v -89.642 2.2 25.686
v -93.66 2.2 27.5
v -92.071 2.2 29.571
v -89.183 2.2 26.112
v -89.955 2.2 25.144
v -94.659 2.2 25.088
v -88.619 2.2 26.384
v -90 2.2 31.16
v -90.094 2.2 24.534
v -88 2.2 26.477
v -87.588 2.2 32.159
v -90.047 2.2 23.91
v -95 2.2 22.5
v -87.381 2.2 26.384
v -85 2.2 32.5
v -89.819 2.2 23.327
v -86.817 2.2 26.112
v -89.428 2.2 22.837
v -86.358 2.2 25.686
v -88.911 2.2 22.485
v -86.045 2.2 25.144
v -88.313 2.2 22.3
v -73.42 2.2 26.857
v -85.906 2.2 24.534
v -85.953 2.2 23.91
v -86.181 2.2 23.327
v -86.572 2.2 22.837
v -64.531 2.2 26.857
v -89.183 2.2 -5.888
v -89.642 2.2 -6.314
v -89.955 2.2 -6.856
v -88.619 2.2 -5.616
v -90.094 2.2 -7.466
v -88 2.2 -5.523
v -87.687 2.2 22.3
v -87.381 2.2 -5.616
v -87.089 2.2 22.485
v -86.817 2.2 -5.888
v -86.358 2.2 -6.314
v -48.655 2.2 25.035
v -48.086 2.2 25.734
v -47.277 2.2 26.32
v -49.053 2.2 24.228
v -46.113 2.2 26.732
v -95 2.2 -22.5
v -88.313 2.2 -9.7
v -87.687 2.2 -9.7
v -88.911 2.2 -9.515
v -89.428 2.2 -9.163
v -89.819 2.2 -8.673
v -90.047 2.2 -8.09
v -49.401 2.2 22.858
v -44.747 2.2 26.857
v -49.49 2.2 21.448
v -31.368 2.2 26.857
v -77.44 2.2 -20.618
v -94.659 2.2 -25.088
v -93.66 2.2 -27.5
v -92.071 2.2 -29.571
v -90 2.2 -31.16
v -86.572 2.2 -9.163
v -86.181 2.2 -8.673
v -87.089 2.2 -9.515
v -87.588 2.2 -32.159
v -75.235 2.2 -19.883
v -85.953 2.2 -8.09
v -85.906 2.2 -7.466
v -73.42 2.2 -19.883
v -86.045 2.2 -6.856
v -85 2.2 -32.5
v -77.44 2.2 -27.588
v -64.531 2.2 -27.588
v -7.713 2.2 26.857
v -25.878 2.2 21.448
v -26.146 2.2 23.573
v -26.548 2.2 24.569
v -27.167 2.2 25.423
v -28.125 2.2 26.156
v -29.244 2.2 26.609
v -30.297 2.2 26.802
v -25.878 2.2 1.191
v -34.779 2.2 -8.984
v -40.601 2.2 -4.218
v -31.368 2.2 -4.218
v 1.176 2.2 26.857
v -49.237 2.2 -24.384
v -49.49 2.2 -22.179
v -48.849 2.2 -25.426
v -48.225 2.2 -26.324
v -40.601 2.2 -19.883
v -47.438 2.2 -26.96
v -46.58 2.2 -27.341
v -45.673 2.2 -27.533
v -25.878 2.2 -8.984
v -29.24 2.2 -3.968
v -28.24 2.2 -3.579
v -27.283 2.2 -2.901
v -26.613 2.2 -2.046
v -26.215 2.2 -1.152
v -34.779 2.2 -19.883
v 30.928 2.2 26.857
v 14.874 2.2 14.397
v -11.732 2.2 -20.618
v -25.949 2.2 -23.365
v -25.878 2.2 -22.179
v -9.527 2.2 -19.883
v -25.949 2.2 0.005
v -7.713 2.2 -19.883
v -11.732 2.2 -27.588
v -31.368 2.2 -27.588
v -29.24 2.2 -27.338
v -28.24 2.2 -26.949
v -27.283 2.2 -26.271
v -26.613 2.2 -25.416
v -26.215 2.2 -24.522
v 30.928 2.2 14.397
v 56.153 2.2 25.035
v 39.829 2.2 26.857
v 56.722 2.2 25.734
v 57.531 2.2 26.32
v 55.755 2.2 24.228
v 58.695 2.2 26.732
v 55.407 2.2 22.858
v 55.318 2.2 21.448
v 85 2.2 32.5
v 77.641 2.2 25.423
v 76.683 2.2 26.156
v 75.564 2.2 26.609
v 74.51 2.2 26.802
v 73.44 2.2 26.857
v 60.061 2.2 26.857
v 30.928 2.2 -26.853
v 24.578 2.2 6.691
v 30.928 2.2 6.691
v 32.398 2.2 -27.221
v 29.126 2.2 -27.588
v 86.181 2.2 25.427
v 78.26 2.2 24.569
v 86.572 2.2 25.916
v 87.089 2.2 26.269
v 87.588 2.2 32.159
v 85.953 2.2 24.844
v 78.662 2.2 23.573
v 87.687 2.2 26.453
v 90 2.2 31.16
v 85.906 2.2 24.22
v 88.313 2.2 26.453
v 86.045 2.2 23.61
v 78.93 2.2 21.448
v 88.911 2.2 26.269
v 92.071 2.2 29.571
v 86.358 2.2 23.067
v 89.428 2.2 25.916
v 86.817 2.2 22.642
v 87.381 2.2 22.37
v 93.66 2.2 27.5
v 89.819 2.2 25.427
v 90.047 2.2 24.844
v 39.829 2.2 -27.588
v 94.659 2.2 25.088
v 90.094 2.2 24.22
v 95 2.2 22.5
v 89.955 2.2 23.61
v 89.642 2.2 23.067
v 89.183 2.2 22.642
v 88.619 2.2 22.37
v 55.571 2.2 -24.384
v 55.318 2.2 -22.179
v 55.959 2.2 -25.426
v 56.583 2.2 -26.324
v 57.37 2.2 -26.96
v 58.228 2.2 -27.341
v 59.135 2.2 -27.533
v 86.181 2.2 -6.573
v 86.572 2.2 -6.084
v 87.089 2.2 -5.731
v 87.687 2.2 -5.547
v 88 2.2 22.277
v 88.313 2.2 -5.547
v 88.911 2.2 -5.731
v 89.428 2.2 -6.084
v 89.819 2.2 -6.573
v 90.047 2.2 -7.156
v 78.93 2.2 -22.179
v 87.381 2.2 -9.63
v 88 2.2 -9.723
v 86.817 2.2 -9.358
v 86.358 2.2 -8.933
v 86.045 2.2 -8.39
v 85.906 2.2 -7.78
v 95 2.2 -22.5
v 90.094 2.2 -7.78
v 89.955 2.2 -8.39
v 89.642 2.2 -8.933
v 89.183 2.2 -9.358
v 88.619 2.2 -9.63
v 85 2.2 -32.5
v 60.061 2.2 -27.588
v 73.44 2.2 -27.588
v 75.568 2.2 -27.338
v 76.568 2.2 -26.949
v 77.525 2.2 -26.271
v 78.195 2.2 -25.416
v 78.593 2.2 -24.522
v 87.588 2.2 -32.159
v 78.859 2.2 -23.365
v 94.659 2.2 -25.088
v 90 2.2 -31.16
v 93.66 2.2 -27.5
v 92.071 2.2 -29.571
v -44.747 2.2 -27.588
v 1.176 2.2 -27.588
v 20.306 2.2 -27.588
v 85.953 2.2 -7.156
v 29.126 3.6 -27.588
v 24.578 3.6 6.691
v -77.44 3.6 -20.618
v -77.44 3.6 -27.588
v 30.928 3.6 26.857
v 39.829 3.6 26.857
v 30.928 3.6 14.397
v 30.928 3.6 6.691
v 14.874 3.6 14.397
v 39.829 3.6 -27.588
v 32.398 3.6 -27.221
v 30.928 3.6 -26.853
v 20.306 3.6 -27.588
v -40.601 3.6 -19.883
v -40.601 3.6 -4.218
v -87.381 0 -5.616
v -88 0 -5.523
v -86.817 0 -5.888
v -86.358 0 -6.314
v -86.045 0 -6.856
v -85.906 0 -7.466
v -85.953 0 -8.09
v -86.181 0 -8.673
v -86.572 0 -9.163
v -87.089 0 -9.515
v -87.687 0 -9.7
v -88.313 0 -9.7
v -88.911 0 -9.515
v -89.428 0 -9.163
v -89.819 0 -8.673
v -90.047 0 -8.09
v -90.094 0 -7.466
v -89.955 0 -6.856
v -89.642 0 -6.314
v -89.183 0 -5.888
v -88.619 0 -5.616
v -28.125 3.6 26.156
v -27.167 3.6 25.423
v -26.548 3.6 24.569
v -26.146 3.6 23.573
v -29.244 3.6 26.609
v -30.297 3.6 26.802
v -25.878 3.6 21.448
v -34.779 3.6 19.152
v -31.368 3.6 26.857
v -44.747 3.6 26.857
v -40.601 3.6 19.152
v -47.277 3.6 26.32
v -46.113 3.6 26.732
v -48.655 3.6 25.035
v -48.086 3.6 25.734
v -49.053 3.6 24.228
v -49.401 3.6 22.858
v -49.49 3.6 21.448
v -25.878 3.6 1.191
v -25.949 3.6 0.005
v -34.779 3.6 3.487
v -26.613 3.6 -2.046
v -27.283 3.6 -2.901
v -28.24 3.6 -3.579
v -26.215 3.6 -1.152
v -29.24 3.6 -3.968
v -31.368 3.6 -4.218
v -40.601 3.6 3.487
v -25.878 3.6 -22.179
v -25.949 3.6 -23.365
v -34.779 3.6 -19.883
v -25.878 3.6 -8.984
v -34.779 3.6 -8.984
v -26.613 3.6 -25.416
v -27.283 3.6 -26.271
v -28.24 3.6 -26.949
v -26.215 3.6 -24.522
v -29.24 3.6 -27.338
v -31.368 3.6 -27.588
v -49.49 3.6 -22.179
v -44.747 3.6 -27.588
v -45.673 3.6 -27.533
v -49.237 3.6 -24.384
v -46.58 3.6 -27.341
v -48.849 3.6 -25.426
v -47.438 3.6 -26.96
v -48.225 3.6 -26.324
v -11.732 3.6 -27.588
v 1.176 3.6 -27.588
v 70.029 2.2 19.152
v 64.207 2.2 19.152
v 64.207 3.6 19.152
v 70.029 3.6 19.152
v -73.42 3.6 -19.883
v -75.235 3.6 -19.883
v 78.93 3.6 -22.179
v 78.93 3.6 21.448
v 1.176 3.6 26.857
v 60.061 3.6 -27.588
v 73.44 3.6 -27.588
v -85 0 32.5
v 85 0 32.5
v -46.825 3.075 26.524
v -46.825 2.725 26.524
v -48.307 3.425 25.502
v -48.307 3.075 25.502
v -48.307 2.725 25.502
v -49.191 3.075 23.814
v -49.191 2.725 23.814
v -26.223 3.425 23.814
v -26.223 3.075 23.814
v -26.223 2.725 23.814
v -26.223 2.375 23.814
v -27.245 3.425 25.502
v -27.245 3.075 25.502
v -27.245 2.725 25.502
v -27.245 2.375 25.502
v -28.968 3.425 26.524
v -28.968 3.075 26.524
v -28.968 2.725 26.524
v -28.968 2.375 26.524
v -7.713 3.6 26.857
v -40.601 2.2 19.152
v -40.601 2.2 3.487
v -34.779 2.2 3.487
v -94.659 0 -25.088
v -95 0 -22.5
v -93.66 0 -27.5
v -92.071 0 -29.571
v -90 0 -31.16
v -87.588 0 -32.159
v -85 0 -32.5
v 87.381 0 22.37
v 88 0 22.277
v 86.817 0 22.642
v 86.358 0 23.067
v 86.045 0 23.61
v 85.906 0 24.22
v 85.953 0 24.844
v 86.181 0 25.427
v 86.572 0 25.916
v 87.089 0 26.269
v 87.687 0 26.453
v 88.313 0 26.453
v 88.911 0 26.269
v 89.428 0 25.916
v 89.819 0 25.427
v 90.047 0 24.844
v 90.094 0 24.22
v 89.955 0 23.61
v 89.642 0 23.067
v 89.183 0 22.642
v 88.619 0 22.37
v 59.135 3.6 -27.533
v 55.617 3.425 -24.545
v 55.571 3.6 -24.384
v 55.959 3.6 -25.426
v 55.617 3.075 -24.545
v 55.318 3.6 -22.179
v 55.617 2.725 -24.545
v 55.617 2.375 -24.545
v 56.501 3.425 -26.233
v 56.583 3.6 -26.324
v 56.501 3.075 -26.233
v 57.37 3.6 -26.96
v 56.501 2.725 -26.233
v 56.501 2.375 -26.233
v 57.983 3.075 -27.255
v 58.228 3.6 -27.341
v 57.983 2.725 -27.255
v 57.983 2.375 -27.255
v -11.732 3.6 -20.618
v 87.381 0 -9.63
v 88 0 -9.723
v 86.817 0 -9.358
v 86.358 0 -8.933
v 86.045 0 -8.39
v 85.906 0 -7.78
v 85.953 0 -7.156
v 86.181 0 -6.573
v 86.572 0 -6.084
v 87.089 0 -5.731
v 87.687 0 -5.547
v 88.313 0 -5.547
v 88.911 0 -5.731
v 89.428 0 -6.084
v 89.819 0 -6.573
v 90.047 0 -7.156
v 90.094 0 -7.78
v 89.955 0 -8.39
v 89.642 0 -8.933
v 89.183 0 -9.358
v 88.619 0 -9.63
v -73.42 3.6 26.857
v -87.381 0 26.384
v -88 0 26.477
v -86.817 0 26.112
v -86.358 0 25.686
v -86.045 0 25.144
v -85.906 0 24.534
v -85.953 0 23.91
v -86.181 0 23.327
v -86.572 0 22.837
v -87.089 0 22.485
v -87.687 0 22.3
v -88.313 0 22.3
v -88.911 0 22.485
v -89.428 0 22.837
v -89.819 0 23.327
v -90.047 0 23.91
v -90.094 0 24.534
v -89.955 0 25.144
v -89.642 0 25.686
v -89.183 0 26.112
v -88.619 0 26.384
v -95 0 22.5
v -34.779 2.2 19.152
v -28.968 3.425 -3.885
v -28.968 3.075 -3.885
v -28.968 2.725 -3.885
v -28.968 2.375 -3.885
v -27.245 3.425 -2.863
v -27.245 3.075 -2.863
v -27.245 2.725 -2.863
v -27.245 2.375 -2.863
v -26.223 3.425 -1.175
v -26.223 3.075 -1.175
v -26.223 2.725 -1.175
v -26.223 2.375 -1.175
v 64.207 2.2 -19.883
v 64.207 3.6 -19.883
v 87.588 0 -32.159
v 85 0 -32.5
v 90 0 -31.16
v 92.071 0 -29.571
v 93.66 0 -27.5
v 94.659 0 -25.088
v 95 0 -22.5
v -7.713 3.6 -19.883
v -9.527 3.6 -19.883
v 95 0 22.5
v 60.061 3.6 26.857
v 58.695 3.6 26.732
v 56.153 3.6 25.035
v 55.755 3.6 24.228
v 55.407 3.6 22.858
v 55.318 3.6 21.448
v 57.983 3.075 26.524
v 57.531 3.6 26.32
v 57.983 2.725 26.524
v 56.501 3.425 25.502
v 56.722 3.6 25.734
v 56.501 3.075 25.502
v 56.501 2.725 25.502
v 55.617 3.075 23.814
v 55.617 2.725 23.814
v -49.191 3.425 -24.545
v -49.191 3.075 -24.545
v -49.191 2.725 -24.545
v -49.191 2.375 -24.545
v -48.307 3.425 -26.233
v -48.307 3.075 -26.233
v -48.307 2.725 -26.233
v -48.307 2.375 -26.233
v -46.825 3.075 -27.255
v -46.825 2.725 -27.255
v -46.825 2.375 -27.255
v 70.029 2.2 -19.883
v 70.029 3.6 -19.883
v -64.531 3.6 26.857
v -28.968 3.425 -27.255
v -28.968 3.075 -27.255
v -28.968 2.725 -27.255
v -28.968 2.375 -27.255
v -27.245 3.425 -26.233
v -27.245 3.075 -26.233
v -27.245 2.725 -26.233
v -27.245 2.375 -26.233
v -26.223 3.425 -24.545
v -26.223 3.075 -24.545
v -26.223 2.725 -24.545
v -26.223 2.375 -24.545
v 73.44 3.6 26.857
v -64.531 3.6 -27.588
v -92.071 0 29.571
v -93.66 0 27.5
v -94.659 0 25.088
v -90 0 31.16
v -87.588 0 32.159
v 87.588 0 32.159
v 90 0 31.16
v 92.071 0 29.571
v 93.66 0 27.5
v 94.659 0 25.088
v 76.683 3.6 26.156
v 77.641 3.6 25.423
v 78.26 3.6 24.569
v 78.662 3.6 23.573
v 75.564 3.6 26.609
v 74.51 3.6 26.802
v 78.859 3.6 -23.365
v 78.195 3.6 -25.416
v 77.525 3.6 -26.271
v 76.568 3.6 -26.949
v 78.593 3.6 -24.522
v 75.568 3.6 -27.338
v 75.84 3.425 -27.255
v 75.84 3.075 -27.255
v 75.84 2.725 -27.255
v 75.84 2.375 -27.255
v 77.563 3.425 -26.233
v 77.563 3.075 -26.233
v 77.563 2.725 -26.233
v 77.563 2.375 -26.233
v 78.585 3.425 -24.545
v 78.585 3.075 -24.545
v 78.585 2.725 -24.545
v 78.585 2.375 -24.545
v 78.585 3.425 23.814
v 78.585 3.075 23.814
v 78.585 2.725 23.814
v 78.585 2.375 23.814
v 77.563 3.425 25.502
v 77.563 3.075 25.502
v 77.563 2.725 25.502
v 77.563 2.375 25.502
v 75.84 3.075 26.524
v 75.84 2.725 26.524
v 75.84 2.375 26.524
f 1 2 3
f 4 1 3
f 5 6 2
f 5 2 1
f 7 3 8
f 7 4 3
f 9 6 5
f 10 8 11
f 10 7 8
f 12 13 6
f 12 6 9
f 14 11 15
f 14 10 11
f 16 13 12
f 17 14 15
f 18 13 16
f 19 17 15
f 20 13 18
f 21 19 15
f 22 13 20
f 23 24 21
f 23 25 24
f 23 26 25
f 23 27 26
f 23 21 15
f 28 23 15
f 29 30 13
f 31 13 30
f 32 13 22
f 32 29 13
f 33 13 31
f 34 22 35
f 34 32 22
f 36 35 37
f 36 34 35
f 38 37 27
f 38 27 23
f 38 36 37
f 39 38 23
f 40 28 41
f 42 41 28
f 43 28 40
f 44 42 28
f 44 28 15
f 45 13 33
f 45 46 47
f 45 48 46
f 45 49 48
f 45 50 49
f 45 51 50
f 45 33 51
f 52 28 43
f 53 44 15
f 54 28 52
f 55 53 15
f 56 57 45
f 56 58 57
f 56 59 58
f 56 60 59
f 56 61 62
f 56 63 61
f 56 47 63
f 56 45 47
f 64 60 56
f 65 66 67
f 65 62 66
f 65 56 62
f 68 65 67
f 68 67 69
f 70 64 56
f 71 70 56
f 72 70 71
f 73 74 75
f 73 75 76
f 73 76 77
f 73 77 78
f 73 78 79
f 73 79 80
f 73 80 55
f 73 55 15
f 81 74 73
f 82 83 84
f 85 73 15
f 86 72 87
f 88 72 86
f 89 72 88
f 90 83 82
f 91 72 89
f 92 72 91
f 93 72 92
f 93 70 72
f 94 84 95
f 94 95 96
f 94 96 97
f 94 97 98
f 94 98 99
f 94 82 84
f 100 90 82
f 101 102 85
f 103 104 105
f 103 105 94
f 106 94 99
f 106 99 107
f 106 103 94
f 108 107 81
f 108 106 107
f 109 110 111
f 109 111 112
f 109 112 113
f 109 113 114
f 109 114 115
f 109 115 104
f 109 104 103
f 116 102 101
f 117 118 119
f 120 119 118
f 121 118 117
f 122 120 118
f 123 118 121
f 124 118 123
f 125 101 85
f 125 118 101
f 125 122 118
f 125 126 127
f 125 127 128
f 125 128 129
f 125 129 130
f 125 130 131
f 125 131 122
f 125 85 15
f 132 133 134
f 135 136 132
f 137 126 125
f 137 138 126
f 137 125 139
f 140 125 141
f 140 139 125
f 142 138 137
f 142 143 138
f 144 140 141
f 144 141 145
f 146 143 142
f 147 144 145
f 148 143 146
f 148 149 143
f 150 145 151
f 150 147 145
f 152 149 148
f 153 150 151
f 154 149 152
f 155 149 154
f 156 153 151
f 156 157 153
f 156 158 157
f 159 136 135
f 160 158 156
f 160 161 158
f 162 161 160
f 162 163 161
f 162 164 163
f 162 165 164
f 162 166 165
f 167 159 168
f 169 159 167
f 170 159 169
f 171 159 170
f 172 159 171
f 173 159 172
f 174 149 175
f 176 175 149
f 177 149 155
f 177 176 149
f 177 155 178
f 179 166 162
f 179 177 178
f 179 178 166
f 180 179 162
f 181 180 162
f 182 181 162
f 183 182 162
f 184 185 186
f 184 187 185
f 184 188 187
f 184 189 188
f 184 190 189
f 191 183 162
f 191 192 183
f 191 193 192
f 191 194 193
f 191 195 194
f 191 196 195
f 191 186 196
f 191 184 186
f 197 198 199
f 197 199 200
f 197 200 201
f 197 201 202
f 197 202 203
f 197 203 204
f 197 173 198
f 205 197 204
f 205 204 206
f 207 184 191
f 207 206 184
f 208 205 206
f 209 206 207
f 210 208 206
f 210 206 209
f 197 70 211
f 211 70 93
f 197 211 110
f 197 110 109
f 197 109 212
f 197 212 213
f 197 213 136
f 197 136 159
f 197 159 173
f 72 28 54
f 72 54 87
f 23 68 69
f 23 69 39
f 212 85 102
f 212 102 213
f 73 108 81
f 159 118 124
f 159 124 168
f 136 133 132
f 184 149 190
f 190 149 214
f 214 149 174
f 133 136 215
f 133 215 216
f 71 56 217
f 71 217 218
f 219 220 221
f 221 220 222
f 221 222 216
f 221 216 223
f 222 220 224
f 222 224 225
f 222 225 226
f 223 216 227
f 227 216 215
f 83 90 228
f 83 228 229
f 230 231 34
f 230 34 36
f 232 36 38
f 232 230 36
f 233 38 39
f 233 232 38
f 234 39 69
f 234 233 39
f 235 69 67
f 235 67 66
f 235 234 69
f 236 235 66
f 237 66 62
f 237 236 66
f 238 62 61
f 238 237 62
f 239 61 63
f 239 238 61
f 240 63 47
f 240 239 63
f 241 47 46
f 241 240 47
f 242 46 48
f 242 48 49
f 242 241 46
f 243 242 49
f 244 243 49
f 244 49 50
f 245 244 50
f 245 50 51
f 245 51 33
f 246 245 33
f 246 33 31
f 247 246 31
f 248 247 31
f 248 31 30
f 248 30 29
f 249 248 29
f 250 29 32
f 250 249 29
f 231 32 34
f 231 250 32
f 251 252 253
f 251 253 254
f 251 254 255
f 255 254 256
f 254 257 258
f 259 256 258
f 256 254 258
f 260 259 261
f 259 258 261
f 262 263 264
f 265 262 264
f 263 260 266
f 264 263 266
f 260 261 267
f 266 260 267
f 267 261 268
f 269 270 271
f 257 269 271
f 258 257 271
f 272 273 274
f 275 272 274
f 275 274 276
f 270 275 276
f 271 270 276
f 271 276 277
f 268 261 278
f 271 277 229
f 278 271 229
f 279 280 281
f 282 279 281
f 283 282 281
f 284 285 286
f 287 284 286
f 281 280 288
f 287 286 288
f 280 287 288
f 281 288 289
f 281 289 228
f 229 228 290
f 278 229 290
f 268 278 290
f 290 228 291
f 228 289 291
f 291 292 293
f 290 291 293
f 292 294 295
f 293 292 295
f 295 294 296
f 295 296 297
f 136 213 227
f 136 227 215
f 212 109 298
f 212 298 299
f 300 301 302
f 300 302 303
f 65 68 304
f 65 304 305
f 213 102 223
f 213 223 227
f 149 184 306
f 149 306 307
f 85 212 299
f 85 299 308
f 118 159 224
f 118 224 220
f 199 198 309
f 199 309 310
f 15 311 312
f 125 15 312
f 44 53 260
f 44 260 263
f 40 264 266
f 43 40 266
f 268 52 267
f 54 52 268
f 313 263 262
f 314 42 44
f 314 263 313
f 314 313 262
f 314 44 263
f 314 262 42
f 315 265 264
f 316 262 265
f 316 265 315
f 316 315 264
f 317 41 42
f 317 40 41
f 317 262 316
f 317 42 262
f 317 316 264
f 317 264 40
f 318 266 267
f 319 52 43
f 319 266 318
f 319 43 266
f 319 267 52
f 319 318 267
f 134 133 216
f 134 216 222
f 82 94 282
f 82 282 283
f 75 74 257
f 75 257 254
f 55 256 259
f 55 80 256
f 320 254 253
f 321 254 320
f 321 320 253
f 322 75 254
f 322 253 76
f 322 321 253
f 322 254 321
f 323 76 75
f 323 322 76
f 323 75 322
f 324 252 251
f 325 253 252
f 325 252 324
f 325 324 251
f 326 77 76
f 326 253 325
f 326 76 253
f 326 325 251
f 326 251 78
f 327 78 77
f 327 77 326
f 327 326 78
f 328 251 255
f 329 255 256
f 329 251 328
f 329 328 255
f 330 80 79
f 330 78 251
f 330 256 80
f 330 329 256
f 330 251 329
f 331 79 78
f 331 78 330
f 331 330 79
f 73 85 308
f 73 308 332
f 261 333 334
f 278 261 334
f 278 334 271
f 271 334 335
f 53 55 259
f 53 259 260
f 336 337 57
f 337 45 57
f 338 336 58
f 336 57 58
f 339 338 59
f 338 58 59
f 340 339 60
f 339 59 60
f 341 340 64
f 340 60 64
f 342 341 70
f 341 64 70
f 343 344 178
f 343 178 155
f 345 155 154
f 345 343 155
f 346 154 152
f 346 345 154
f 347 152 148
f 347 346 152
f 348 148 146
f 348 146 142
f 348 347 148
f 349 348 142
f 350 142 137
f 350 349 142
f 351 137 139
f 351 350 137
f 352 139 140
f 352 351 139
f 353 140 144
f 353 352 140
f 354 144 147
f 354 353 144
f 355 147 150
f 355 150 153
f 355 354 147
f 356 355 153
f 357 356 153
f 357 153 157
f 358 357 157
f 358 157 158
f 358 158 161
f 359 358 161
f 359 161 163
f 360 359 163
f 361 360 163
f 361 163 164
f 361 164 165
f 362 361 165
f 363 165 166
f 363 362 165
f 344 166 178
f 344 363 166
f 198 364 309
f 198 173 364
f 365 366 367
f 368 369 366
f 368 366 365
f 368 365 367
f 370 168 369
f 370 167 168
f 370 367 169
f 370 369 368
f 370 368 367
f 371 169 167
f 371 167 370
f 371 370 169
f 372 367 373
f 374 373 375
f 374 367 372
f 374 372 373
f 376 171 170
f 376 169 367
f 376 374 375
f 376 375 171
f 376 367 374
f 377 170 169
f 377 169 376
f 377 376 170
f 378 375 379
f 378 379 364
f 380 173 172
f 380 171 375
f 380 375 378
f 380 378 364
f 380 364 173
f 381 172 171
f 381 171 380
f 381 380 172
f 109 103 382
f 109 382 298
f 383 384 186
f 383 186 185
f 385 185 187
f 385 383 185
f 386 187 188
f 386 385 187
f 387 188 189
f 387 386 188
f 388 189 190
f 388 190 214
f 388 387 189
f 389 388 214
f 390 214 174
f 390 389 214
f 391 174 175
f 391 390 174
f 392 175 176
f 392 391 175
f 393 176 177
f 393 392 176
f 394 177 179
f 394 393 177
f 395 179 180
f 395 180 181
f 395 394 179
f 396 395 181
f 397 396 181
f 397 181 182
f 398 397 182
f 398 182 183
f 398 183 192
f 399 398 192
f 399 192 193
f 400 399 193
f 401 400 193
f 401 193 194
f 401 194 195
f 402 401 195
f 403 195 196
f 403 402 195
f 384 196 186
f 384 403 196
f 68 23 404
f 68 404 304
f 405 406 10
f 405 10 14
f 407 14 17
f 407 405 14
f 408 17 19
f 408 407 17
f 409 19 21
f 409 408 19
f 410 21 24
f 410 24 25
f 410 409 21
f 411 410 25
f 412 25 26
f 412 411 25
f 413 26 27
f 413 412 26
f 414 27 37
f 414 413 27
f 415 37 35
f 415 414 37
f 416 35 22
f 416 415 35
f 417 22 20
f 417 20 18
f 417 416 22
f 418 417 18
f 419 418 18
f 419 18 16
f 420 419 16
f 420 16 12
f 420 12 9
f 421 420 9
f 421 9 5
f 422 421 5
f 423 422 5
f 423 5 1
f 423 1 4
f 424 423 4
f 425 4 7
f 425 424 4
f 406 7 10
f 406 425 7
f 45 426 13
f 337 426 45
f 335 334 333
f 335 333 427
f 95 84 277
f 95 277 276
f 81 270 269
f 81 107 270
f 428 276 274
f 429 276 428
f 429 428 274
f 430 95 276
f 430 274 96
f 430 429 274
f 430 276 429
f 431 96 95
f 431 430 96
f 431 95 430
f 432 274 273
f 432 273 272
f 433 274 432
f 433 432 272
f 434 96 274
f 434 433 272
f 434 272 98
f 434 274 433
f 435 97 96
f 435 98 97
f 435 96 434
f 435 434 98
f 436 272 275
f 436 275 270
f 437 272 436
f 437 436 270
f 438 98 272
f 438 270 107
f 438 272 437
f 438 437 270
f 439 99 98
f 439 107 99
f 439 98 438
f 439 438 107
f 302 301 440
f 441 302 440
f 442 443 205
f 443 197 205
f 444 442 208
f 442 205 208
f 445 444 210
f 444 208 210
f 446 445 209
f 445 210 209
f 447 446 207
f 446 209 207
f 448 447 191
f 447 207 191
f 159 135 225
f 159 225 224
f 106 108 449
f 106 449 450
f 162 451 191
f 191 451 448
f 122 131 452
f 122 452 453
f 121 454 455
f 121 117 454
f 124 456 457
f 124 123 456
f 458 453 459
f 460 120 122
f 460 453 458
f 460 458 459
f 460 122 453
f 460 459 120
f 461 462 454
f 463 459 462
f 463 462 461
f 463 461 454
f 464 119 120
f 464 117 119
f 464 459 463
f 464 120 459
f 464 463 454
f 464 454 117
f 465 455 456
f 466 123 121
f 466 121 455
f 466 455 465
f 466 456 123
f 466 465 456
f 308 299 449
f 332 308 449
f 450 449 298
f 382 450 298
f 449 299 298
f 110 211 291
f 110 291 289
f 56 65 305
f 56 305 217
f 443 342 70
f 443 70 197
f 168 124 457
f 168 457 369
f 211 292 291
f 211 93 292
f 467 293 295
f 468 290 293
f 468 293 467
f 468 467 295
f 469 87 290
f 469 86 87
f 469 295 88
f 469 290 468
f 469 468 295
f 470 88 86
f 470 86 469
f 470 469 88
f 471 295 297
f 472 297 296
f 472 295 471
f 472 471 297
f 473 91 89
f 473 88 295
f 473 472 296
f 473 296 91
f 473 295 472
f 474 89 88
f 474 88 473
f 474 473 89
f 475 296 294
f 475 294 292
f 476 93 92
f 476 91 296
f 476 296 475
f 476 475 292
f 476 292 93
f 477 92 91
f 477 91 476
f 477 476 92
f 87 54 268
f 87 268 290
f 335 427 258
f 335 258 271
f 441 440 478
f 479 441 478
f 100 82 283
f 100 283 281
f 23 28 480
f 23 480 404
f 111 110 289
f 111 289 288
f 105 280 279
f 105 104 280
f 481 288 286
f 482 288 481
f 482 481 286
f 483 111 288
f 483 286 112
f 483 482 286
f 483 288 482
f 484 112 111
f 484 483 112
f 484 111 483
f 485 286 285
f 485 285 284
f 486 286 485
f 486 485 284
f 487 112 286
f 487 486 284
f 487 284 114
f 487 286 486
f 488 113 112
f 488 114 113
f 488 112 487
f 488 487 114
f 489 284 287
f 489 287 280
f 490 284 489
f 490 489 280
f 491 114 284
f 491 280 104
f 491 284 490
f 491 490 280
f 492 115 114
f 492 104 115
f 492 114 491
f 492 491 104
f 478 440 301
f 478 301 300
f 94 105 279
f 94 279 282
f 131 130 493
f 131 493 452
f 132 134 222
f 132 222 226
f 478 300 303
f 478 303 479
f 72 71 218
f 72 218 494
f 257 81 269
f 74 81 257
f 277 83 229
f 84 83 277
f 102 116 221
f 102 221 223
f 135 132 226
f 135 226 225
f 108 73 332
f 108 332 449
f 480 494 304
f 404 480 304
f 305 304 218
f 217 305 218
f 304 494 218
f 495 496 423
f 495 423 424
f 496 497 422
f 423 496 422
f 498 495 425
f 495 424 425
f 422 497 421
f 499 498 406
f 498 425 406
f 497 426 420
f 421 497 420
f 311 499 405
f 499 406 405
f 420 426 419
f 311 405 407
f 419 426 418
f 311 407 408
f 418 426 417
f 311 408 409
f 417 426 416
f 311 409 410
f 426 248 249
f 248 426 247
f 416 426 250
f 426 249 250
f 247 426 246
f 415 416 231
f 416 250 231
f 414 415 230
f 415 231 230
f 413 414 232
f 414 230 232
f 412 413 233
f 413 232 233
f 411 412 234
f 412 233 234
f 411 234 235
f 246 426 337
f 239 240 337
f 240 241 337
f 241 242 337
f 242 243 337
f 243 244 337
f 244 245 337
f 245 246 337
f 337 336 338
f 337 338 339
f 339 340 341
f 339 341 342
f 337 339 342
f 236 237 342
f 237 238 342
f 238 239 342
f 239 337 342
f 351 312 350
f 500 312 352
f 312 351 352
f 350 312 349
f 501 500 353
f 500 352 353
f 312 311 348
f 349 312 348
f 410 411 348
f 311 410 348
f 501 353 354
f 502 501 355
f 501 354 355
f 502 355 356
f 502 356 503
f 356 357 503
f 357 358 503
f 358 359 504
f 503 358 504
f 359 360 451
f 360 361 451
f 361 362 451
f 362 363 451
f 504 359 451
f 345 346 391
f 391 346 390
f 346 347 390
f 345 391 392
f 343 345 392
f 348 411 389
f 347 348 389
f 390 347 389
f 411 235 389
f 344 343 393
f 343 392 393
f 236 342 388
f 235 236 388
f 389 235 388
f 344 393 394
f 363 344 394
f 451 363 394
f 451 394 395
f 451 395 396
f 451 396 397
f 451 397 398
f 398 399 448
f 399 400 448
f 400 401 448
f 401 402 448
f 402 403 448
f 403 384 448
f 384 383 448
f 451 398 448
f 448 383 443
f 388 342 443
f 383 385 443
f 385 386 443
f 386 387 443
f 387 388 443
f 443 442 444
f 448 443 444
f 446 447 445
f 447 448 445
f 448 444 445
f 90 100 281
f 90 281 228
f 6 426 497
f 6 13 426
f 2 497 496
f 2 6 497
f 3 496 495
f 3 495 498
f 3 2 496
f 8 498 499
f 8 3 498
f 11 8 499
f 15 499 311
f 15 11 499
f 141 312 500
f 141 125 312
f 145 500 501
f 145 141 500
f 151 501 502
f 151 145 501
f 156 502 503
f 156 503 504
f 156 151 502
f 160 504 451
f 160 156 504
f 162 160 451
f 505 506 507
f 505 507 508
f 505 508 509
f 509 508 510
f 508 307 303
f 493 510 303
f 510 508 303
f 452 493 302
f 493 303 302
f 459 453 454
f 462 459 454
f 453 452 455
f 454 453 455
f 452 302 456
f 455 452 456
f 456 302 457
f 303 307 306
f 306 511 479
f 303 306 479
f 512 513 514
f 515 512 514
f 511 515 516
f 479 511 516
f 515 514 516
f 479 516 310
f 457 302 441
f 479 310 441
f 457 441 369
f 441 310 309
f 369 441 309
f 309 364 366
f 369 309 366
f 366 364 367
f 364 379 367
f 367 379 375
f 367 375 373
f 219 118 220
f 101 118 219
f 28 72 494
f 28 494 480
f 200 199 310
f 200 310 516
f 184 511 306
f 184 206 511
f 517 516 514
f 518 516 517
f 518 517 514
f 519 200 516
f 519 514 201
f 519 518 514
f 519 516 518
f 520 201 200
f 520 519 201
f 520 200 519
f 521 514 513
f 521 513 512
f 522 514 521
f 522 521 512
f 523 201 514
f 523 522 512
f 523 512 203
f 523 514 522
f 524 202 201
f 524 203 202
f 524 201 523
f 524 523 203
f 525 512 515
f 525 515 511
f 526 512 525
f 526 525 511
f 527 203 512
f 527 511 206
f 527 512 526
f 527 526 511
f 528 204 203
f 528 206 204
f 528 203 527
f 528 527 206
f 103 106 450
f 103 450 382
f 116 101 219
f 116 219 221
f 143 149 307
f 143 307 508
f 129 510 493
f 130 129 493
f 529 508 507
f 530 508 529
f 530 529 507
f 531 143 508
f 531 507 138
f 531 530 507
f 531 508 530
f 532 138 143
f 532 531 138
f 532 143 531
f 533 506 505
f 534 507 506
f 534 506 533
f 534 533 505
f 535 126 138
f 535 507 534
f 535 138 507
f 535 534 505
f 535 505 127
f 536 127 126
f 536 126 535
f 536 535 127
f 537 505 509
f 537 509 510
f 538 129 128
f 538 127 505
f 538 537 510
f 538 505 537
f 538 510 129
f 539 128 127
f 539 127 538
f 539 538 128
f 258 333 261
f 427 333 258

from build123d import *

# Parameters (mm, degrees)
SKETCH1_W           = 190
SKETCH1_H           = 65
SKETCH1_R           = 2.1
BOSS_EXTRUDE1_DEPTH = 2.2
SKETCH3_W           = 5.822409575
SKETCH3_H           = 15.664234042
SKETCH3_W_2         = 5.822409574
SKETCH3_H_2         = 39.034260638
BOSS_EXTRUDE3_DEPTH = 1.4
FILLET1_R           = 10


with BuildPart() as part:
    # Sketch1 → Boss-Extrude1 (new body)
    with BuildSketch(Plane(origin=(0, 0, 0), x_dir=(1, 0, 0), z_dir=(0, 1, 0))):
        Rectangle(SKETCH1_W, SKETCH1_H)
        with Locations(Location((-88, 7.623179707, 0), (0, 0, 270))):
            Circle(SKETCH1_R, mode=Mode.SUBTRACT)
        with Locations(Location((-88, -24.376820293, 0), (0, 0, 270))):
            Circle(SKETCH1_R, mode=Mode.SUBTRACT)
        with Locations(Location((88, -24.376820293, 0), (0, 0, 90))):
            Circle(SKETCH1_R, mode=Mode.SUBTRACT)
        with Locations(Location((88, 7.623179707, 0), (0, 0, 90))):
            Circle(SKETCH1_R, mode=Mode.SUBTRACT)
    extrude(amount=BOSS_EXTRUDE1_DEPTH)

    # Sketch3 → Boss-Extrude3 (add)
    # profile 1 of 5: a face of its own
    with BuildSketch(Plane(origin=(0, 2.2, 0), x_dir=(1, 0, 0), z_dir=(0, 1, 0))):
        Polygon((-77.439519604, 20.61757665), (-77.439519604, 27.58839048), (-64.531455774, 27.58839048), (-64.531455774, -26.857455265), (-73.42010471, -26.857455265), (-73.42010471, 19.882597927), (-75.234583434, 19.882597927), align=None)
    # profile 2 of 5: a face of its own
    with BuildSketch(Plane(origin=(0, 2.2, 0), x_dir=(1, 0, 0), z_dir=(0, 1, 0))):
        with BuildLine():
            Line((-34.778598327, 8.984241544), (-34.778598327, 19.882597927))
            Line((-34.778598327, 19.882597927), (-40.601007902, 19.882597927))
            Line((-40.601007902, 19.882597927), (-40.601007902, 4.218363884))
            Line((-40.601007902, 4.218363884), (-31.367837689, 4.218363884))
            add(Edge.make_bspline(
                [(-31.367837689, 4.218363884), (-30.937734177, 4.205882557), (-30.126413548, 4.182338553), (-28.991073812, 3.931040784), (-28.02102206, 3.502870767), (-27.219902727, 2.897866579), (-26.601465528, 2.109735687), (-26.1809682, 1.150054083), (-25.910893392, 0.033711404), (-25.889664372, -0.767797312), (-25.878465349, -1.190620158)],
                knots=[0, 0, 0, 0, 1.167027584, 2.201408559, 3.136967793, 4.027212192, 4.901025933, 5.82711576, 6.853730371, 8, 8, 8, 8], degree=3))
            Line((-25.878465349, -1.190620158), (-25.878465349, -21.448471222))
            add(Edge.make_bspline(
                [(-25.878465349, -21.448471222), (-25.889664372, -21.871294068), (-25.910893392, -22.672802785), (-26.1809682, -23.789145463), (-26.601465528, -24.748827067), (-27.219902727, -25.53695796), (-28.02102206, -26.141962147), (-28.991073812, -26.570132165), (-30.126413548, -26.821429933), (-30.937734177, -26.844973937), (-31.367837689, -26.857455265)],
                knots=[0, 0, 0, 0, 1.146269629, 2.17288424, 3.098974067, 3.972787808, 4.863032207, 5.798591441, 6.832972416, 8, 8, 8, 8], degree=3))
            Line((-31.367837689, -26.857455265), (-44.746747264, -26.857455265))
            add(Edge.make_bspline(
                [(-44.746747264, -26.857455265), (-45.119703537, -26.844982711), (-45.825659581, -26.821373845), (-46.813372336, -26.566574969), (-47.656481489, -26.137409968), (-48.33959709, -25.520537859), (-48.870362201, -24.736796043), (-49.228799232, -23.781135063), (-49.463163603, -22.669394461), (-49.48049008, -21.870915209), (-49.489656838, -21.448471222)],
                knots=[0, 0, 0, 0, 1.084734094, 2.05325569, 2.94625814, 3.815111374, 4.706091482, 5.677498929, 6.771255973, 8, 8, 8, 8], degree=3))
            Line((-49.489656838, -21.448471222), (-49.489656838, 22.179406438))
            add(Edge.make_bspline(
                [(-49.489656838, 22.179406438), (-49.48049008, 22.601850424), (-49.463163603, 23.400329677), (-49.228799232, 24.512070279), (-48.870362201, 25.467731259), (-48.33959709, 26.251473075), (-47.656481489, 26.868345184), (-46.813372336, 27.297510184), (-45.825659581, 27.55230906), (-45.119703537, 27.575917926), (-44.746747264, 27.58839048)],
                knots=[0, 0, 0, 0, 1.228744027, 2.322501071, 3.293908518, 4.184888626, 5.05374186, 5.94674431, 6.915265906, 8, 8, 8, 8], degree=3))
            Line((-44.746747264, 27.58839048), (-31.367837689, 27.58839048))
            add(Edge.make_bspline(
                [(-31.367837689, 27.58839048), (-30.937734177, 27.575909152), (-30.126413548, 27.552365149), (-28.991073812, 27.30106738), (-28.02102206, 26.872897363), (-27.219902727, 26.267893175), (-26.601465528, 25.479762283), (-26.1809682, 24.520080679), (-25.910893392, 23.403738), (-25.889664372, 22.602229284), (-25.878465349, 22.179406438)],
                knots=[0, 0, 0, 0, 1.167027584, 2.201408559, 3.136967793, 4.027212192, 4.901025933, 5.82711576, 6.853730371, 8, 8, 8, 8], degree=3))
            Line((-25.878465349, 22.179406438), (-25.878465349, 8.984241544))
            Line((-25.878465349, 8.984241544), (-34.778598327, 8.984241544))
        make_face()
        with Locations((-37.689803115, -11.31954569)):
            Rectangle(SKETCH3_W, SKETCH3_H, mode=Mode.SUBTRACT)
    # profile 3 of 5: a face of its own
    with BuildSketch(Plane(origin=(0, 2.2, 0), x_dir=(1, 0, 0), z_dir=(0, 1, 0))):
        Polygon((-11.732421732, 20.61757665), (-11.732421732, 27.58839048), (1.175642098, 27.58839048), (1.175642098, -26.857455265), (-7.713006838, -26.857455265), (-7.713006838, 19.882597927), (-9.527485561, 19.882597927), align=None)
    # profile 4 of 5: a face of its own
    with BuildSketch(Plane(origin=(0, 2.2, 0), x_dir=(1, 0, 0), z_dir=(0, 1, 0))):
        Polygon((32.398456992, 27.220901118), (39.828632524, 27.58839048), (39.828632524, -26.857455265), (30.928499545, -26.857455265), (30.928499545, -14.397269094), (14.873808056, -14.397269094), (20.305760183, 27.58839048), (29.125504864, 27.58839048), (24.577824013, -6.691476541), (30.928499545, -6.691476541), (30.928499545, 26.853411757), align=None)
    # profile 5 of 5: a face of its own
    with BuildSketch(Plane(origin=(0, 2.2, 0), x_dir=(1, 0, 0), z_dir=(0, 1, 0))):
        with BuildLine():
            add(Edge.make_bspline(
                [(73.440128268, 27.58839048), (73.870231781, 27.575909152), (74.68155241, 27.552365149), (75.816892146, 27.30106738), (76.786943898, 26.872897363), (77.58806323, 26.267893175), (78.20650043, 25.479762283), (78.626997757, 24.520080679), (78.897072565, 23.403738), (78.918301585, 22.602229284), (78.929500609, 22.179406438)],
                knots=[0, 0, 0, 0, 1.167027584, 2.201408559, 3.136967793, 4.027212192, 4.901025933, 5.82711576, 6.853730371, 8, 8, 8, 8], degree=3))
            Line((78.929500609, 22.179406438), (78.929500609, -21.448471222))
            add(Edge.make_bspline(
                [(78.929500609, -21.448471222), (78.918301585, -21.871294068), (78.897072565, -22.672802785), (78.626997757, -23.789145463), (78.20650043, -24.748827067), (77.58806323, -25.53695796), (76.786943898, -26.141962147), (75.816892146, -26.570132165), (74.68155241, -26.821429933), (73.870231781, -26.844973937), (73.440128268, -26.857455265)],
                knots=[0, 0, 0, 0, 1.146269629, 2.17288424, 3.098974067, 3.972787808, 4.863032207, 5.798591441, 6.832972416, 8, 8, 8, 8], degree=3))
            Line((73.440128268, -26.857455265), (60.061218694, -26.857455265))
            add(Edge.make_bspline(
                [(60.061218694, -26.857455265), (59.688262421, -26.844982711), (58.982306376, -26.821373845), (57.994593622, -26.566574969), (57.151484468, -26.137409968), (56.468368867, -25.520537859), (55.937603756, -24.736796043), (55.579166725, -23.781135063), (55.344802355, -22.669394461), (55.327475878, -21.870915209), (55.318309119, -21.448471222)],
                knots=[0, 0, 0, 0, 1.084734094, 2.05325569, 2.94625814, 3.815111374, 4.706091482, 5.677498929, 6.771255973, 8, 8, 8, 8], degree=3))
            Line((55.318309119, -21.448471222), (55.318309119, 22.179406438))
            add(Edge.make_bspline(
                [(55.318309119, 22.179406438), (55.327475878, 22.601850424), (55.344802355, 23.400329677), (55.579166725, 24.512070279), (55.937603756, 25.467731259), (56.468368867, 26.251473075), (57.151484468, 26.868345184), (57.994593622, 27.297510184), (58.982306376, 27.55230906), (59.688262421, 27.575917926), (60.061218694, 27.58839048)],
                knots=[0, 0, 0, 0, 1.228744027, 2.322501071, 3.293908518, 4.184888626, 5.05374186, 5.94674431, 6.915265906, 8, 8, 8, 8], degree=3))
            Line((60.061218694, 27.58839048), (73.440128268, 27.58839048))
        make_face()
        with Locations((67.118162843, 0.365467608)):
            Rectangle(SKETCH3_W_2, SKETCH3_H_2, mode=Mode.SUBTRACT)
    extrude(amount=BOSS_EXTRUDE3_DEPTH)

    # Fillet1
    fillet1_edges = [part.edges().sort_by_distance(p)[0] for p in [
        (95, 1.1, 32.5),
        (-95, 1.1, 32.5),
        (-95, 1.1, -32.5),
        (95, 1.1, -32.5),
    ]]
    fillet(fillet1_edges, radius=FILLET1_R)


solid = part.part
